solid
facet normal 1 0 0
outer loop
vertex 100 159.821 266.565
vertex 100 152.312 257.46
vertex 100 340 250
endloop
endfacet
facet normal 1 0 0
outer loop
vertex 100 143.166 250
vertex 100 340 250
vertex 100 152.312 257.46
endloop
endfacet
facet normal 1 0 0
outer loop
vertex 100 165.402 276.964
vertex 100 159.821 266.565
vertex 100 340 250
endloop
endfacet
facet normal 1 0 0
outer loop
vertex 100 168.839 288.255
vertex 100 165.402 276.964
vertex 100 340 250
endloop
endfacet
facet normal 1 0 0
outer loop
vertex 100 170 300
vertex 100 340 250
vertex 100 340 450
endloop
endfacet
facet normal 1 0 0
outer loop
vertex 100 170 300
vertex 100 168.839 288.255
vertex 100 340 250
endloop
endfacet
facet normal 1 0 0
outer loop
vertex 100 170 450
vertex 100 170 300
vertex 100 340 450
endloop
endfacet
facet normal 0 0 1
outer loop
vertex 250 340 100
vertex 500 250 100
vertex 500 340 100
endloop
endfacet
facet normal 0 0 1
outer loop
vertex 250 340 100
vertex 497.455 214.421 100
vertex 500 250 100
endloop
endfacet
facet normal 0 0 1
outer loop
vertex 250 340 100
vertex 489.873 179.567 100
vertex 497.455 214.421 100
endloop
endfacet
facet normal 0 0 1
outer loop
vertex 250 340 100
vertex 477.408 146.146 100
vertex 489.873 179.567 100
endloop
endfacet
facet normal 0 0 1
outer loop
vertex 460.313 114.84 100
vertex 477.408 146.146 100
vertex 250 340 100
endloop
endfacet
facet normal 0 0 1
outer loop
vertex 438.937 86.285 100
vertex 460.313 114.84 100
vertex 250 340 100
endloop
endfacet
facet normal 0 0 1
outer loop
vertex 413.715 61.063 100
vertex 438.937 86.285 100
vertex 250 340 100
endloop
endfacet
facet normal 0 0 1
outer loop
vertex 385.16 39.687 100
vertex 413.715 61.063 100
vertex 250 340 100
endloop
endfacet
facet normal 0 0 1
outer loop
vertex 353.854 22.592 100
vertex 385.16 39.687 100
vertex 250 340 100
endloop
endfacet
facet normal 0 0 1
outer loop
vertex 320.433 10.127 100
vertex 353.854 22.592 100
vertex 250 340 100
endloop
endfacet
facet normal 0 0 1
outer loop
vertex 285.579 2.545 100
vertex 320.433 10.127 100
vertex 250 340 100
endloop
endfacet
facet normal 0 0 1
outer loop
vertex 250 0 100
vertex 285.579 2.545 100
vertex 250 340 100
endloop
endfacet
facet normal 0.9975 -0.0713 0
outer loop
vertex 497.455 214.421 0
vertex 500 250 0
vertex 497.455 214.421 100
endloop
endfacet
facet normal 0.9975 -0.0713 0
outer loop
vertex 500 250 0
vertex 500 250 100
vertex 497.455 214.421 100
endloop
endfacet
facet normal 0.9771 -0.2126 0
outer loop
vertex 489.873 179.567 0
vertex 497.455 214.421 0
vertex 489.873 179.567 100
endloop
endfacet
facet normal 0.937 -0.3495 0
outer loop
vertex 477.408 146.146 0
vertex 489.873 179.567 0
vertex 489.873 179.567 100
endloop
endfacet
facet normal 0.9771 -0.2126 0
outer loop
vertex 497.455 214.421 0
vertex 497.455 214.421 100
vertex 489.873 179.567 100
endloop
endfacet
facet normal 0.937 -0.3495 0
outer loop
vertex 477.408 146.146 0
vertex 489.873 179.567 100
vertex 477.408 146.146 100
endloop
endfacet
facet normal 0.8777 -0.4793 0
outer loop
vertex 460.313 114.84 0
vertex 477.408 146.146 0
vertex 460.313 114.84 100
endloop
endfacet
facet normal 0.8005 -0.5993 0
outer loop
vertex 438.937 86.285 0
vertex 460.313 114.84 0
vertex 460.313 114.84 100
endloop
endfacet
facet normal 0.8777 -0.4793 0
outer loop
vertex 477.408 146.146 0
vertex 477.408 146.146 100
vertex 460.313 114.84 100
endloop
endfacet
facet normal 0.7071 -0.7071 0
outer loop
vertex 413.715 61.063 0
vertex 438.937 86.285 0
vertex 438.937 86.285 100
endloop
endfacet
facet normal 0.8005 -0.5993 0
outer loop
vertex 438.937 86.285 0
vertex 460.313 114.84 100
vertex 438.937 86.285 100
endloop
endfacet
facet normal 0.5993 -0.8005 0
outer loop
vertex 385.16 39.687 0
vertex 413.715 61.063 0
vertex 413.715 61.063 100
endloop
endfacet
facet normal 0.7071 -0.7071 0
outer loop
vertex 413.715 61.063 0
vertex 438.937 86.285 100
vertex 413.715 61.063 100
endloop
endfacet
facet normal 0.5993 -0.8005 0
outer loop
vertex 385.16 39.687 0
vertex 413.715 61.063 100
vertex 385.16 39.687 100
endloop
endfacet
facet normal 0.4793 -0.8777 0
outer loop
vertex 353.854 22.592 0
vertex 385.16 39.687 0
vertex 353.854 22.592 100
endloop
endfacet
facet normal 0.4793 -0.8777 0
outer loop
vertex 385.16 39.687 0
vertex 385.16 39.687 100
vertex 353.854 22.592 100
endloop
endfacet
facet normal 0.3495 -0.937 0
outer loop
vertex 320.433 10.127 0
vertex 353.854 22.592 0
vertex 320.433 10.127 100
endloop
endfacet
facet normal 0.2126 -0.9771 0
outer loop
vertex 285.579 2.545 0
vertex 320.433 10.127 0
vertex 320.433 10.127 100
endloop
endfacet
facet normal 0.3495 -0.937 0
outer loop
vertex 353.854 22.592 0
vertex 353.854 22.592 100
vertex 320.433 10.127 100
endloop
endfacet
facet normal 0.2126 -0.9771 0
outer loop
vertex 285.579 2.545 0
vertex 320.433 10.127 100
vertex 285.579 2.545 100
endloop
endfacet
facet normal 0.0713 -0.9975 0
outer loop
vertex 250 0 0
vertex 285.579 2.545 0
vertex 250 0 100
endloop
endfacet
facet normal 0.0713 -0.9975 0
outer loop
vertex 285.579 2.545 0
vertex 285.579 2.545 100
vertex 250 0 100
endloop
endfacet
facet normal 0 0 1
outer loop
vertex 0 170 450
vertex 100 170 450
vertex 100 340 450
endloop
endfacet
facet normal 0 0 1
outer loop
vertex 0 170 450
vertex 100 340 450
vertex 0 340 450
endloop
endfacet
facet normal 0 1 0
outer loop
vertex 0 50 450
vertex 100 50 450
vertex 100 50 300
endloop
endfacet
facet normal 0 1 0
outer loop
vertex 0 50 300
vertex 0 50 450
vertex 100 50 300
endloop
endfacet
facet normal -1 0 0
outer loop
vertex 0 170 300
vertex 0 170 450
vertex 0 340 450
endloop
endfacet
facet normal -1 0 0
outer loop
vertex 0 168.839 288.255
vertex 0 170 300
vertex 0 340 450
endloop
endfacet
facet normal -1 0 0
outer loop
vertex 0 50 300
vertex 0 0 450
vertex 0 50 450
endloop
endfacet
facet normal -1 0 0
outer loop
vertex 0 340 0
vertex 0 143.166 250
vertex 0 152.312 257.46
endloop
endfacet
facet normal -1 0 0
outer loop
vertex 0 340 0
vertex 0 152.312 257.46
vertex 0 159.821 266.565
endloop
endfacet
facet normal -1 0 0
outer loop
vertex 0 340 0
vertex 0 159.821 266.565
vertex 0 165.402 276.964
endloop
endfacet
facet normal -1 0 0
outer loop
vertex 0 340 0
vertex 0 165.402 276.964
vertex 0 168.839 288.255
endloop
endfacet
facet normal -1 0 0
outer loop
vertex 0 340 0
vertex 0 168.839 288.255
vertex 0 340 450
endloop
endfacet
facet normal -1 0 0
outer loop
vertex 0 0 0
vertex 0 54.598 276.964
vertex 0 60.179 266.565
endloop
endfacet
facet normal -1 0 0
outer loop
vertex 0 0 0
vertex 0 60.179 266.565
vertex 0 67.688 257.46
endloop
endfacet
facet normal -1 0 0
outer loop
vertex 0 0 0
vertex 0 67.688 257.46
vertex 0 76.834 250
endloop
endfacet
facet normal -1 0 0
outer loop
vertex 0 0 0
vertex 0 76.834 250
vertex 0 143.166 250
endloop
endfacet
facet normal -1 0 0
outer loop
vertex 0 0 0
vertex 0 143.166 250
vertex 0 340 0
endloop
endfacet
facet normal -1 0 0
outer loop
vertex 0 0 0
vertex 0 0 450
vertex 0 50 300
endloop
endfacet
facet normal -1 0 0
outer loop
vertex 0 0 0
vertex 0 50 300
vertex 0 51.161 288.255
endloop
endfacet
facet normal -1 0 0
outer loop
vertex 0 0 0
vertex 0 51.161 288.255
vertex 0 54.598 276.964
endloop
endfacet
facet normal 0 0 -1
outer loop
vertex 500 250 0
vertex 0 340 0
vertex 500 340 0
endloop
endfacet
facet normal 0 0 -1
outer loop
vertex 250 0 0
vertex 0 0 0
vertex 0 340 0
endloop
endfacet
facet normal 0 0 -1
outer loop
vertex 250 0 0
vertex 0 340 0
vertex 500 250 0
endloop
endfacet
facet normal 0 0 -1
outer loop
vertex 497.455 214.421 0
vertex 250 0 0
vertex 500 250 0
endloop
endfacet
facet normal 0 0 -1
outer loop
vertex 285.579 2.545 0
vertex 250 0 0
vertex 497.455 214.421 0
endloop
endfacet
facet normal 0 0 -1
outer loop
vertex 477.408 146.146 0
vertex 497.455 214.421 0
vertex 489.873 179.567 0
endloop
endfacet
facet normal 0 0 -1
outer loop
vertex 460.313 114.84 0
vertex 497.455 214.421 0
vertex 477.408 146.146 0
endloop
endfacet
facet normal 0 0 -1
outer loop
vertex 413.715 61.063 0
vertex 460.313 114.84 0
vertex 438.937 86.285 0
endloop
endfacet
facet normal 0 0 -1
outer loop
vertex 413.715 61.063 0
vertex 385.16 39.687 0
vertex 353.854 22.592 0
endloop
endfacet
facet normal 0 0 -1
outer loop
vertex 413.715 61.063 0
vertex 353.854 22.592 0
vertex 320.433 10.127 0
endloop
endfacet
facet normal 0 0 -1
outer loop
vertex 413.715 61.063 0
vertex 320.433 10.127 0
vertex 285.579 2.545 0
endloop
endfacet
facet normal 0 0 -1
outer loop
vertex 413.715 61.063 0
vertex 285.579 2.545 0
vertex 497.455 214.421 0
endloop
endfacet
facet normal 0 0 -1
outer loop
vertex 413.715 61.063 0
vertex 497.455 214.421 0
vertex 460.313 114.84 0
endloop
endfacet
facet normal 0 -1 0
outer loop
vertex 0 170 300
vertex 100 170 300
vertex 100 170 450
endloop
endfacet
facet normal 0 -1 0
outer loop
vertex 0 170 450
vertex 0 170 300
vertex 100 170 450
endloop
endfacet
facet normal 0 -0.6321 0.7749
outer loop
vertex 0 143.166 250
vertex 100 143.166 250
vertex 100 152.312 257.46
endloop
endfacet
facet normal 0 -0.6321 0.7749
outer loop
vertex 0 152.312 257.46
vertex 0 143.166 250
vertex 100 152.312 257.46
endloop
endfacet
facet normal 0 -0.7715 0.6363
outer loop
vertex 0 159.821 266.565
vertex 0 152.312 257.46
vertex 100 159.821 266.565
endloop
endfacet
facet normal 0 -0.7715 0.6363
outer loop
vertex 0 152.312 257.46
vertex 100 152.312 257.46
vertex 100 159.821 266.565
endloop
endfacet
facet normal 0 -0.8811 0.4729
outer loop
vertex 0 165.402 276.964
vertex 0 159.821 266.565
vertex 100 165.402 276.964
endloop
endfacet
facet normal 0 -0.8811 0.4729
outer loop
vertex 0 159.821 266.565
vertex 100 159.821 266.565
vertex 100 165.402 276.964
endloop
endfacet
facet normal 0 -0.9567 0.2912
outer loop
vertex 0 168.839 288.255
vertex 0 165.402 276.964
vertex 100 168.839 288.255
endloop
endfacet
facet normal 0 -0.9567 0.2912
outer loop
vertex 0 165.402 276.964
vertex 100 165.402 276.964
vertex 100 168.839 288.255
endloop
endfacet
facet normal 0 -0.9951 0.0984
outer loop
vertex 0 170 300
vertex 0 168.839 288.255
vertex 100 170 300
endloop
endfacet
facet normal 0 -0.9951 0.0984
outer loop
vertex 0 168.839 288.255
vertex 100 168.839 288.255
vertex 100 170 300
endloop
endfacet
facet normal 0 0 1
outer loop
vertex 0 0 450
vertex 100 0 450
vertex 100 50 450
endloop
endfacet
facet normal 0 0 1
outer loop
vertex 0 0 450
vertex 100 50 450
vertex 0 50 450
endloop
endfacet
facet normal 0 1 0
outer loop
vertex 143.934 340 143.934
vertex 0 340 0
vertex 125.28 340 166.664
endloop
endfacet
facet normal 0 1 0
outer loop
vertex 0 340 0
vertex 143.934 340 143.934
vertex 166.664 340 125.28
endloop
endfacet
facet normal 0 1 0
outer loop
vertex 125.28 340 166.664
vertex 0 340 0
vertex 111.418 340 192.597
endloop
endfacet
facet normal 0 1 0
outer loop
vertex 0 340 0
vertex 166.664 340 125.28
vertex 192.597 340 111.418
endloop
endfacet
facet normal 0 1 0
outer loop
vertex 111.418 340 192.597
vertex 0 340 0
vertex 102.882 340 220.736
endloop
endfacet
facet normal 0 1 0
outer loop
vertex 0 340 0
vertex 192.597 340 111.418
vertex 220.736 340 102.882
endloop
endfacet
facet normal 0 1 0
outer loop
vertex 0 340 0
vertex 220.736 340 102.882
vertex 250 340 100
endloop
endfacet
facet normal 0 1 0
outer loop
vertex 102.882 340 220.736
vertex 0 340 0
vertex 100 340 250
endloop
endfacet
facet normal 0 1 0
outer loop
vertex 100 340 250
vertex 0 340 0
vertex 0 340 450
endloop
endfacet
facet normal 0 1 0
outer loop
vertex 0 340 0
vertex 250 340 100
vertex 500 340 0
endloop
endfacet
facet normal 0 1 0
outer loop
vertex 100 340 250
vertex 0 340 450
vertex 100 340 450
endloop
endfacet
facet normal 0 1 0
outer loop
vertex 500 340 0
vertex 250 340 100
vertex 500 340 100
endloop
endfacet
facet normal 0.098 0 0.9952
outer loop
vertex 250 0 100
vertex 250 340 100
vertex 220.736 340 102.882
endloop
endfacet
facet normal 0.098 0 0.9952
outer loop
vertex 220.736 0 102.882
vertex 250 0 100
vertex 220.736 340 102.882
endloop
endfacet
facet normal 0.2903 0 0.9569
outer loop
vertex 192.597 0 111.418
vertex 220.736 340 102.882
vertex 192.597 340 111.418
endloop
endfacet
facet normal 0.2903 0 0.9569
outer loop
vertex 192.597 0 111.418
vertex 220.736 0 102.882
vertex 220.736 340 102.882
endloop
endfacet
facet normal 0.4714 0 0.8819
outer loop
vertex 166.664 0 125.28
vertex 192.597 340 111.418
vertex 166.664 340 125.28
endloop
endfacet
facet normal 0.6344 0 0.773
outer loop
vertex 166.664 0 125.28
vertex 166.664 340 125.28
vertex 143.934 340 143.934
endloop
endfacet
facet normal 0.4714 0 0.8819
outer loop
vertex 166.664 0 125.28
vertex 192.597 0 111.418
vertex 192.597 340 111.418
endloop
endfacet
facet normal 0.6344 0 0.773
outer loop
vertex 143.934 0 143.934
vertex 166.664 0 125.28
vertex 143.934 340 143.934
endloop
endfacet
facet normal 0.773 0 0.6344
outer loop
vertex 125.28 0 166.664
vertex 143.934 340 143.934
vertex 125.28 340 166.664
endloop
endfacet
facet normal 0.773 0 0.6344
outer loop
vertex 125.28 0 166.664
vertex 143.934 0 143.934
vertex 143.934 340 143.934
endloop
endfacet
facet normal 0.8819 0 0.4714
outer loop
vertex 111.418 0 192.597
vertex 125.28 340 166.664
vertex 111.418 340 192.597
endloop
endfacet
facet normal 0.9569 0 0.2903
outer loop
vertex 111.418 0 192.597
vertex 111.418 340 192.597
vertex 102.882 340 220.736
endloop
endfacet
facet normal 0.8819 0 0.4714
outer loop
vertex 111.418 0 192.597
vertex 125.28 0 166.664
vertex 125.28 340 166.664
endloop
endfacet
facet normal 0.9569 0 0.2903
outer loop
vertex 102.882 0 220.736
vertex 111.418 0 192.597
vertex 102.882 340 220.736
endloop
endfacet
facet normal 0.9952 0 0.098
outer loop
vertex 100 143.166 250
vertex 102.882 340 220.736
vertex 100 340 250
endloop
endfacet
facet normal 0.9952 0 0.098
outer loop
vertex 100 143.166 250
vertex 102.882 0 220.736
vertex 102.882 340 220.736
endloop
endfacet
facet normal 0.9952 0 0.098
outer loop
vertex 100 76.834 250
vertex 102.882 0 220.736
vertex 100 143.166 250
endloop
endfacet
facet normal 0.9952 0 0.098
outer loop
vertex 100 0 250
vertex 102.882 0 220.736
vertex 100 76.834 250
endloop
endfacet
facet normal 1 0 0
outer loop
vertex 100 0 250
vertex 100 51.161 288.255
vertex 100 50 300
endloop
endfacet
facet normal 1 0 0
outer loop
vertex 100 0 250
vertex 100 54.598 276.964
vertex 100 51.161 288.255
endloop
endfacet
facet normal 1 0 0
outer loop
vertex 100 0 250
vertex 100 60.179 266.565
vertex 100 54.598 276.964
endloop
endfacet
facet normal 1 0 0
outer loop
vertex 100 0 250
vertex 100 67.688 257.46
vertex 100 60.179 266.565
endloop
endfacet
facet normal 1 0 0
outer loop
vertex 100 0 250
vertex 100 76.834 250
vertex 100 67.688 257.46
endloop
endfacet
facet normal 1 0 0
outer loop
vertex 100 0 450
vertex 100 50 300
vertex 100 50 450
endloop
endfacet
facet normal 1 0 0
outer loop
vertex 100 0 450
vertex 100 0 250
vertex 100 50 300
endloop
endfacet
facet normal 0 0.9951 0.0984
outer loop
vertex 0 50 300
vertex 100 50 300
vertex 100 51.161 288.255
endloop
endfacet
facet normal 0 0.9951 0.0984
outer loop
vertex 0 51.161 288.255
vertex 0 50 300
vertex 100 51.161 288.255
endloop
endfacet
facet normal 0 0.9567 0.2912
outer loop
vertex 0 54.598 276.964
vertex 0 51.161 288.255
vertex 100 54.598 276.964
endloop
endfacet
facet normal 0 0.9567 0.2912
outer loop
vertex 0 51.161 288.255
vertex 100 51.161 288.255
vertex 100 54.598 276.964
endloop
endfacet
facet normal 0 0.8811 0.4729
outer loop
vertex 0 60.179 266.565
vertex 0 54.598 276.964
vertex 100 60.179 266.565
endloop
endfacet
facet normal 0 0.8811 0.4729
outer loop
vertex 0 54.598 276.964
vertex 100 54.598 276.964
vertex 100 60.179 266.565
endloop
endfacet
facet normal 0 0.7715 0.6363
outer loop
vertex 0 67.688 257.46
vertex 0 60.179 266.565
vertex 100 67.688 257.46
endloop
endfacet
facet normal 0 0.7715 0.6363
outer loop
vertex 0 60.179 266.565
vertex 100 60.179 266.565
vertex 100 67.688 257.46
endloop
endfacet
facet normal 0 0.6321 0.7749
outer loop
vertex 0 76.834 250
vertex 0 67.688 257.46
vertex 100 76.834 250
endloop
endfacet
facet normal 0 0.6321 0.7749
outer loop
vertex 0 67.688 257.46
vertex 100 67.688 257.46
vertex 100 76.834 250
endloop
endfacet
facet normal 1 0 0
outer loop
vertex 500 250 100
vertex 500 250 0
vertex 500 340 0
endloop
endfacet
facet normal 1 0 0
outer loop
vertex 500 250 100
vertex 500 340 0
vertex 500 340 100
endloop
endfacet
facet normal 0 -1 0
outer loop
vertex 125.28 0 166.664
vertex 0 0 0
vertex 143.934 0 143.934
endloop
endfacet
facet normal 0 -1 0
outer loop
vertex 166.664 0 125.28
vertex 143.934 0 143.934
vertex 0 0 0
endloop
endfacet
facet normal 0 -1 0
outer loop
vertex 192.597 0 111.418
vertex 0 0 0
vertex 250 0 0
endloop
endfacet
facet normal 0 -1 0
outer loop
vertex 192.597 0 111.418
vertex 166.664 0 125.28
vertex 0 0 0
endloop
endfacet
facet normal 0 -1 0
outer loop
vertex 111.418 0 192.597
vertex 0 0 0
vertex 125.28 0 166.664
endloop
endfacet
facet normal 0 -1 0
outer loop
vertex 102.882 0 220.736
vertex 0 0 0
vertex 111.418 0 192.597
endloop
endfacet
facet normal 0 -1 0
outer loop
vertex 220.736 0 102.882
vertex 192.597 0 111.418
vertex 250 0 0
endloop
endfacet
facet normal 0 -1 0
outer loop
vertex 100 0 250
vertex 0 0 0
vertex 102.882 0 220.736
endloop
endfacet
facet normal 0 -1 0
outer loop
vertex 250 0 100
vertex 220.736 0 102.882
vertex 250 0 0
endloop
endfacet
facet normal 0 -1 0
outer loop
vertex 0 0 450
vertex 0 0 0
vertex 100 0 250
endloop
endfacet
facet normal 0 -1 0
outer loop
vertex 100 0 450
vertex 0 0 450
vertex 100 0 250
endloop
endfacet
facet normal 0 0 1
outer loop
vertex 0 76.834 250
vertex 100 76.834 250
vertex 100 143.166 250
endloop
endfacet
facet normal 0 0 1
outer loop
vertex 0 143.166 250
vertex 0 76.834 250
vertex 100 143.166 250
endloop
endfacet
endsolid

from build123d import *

# Parameters (mm, degrees)
F1_DEPTH = 340
F2_R     = 250
F4_DEPTH = 277.5


with BuildPart() as f1:
    # F0 (on Front) → F1 (new body)
    with BuildSketch(Plane.XZ):
        with BuildLine():
            Line((0, 450), (0, 0))
            Line((0, 0), (500, 0))
            Line((500, 0), (500, 100))
            Line((500, 100), (250, 100))
            ThreePointArc((250, 100), (143.933983, 143.933983), (100, 250))
            Line((100, 250), (100, 450))
            Line((100, 450), (0, 450))
        make_face()
    extrude(amount=-F1_DEPTH)

    # F2
    f2_edges = [f1.edges().sort_by_distance(p)[0] for p in [
        (500, 0, 50),
    ]]
    fillet(f2_edges, radius=F2_R)

    # F3 (on face) → F4 (cut)
    with BuildSketch(Plane.YZ.offset(100)):
        with BuildLine():
            Line((50, 450), (50, 300))
            ThreePointArc((50, 300), (57.132359, 271.627257), (76.833752, 250))
            Line((76.833752, 250), (143.166248, 250))
            ThreePointArc((143.166248, 250), (162.867641, 271.627257), (170, 300))
            Line((170, 300), (170, 450))
            Line((170, 450), (50, 450))
        make_face()
    extrude(amount=-F4_DEPTH, mode=Mode.SUBTRACT)


solid = f1.part
